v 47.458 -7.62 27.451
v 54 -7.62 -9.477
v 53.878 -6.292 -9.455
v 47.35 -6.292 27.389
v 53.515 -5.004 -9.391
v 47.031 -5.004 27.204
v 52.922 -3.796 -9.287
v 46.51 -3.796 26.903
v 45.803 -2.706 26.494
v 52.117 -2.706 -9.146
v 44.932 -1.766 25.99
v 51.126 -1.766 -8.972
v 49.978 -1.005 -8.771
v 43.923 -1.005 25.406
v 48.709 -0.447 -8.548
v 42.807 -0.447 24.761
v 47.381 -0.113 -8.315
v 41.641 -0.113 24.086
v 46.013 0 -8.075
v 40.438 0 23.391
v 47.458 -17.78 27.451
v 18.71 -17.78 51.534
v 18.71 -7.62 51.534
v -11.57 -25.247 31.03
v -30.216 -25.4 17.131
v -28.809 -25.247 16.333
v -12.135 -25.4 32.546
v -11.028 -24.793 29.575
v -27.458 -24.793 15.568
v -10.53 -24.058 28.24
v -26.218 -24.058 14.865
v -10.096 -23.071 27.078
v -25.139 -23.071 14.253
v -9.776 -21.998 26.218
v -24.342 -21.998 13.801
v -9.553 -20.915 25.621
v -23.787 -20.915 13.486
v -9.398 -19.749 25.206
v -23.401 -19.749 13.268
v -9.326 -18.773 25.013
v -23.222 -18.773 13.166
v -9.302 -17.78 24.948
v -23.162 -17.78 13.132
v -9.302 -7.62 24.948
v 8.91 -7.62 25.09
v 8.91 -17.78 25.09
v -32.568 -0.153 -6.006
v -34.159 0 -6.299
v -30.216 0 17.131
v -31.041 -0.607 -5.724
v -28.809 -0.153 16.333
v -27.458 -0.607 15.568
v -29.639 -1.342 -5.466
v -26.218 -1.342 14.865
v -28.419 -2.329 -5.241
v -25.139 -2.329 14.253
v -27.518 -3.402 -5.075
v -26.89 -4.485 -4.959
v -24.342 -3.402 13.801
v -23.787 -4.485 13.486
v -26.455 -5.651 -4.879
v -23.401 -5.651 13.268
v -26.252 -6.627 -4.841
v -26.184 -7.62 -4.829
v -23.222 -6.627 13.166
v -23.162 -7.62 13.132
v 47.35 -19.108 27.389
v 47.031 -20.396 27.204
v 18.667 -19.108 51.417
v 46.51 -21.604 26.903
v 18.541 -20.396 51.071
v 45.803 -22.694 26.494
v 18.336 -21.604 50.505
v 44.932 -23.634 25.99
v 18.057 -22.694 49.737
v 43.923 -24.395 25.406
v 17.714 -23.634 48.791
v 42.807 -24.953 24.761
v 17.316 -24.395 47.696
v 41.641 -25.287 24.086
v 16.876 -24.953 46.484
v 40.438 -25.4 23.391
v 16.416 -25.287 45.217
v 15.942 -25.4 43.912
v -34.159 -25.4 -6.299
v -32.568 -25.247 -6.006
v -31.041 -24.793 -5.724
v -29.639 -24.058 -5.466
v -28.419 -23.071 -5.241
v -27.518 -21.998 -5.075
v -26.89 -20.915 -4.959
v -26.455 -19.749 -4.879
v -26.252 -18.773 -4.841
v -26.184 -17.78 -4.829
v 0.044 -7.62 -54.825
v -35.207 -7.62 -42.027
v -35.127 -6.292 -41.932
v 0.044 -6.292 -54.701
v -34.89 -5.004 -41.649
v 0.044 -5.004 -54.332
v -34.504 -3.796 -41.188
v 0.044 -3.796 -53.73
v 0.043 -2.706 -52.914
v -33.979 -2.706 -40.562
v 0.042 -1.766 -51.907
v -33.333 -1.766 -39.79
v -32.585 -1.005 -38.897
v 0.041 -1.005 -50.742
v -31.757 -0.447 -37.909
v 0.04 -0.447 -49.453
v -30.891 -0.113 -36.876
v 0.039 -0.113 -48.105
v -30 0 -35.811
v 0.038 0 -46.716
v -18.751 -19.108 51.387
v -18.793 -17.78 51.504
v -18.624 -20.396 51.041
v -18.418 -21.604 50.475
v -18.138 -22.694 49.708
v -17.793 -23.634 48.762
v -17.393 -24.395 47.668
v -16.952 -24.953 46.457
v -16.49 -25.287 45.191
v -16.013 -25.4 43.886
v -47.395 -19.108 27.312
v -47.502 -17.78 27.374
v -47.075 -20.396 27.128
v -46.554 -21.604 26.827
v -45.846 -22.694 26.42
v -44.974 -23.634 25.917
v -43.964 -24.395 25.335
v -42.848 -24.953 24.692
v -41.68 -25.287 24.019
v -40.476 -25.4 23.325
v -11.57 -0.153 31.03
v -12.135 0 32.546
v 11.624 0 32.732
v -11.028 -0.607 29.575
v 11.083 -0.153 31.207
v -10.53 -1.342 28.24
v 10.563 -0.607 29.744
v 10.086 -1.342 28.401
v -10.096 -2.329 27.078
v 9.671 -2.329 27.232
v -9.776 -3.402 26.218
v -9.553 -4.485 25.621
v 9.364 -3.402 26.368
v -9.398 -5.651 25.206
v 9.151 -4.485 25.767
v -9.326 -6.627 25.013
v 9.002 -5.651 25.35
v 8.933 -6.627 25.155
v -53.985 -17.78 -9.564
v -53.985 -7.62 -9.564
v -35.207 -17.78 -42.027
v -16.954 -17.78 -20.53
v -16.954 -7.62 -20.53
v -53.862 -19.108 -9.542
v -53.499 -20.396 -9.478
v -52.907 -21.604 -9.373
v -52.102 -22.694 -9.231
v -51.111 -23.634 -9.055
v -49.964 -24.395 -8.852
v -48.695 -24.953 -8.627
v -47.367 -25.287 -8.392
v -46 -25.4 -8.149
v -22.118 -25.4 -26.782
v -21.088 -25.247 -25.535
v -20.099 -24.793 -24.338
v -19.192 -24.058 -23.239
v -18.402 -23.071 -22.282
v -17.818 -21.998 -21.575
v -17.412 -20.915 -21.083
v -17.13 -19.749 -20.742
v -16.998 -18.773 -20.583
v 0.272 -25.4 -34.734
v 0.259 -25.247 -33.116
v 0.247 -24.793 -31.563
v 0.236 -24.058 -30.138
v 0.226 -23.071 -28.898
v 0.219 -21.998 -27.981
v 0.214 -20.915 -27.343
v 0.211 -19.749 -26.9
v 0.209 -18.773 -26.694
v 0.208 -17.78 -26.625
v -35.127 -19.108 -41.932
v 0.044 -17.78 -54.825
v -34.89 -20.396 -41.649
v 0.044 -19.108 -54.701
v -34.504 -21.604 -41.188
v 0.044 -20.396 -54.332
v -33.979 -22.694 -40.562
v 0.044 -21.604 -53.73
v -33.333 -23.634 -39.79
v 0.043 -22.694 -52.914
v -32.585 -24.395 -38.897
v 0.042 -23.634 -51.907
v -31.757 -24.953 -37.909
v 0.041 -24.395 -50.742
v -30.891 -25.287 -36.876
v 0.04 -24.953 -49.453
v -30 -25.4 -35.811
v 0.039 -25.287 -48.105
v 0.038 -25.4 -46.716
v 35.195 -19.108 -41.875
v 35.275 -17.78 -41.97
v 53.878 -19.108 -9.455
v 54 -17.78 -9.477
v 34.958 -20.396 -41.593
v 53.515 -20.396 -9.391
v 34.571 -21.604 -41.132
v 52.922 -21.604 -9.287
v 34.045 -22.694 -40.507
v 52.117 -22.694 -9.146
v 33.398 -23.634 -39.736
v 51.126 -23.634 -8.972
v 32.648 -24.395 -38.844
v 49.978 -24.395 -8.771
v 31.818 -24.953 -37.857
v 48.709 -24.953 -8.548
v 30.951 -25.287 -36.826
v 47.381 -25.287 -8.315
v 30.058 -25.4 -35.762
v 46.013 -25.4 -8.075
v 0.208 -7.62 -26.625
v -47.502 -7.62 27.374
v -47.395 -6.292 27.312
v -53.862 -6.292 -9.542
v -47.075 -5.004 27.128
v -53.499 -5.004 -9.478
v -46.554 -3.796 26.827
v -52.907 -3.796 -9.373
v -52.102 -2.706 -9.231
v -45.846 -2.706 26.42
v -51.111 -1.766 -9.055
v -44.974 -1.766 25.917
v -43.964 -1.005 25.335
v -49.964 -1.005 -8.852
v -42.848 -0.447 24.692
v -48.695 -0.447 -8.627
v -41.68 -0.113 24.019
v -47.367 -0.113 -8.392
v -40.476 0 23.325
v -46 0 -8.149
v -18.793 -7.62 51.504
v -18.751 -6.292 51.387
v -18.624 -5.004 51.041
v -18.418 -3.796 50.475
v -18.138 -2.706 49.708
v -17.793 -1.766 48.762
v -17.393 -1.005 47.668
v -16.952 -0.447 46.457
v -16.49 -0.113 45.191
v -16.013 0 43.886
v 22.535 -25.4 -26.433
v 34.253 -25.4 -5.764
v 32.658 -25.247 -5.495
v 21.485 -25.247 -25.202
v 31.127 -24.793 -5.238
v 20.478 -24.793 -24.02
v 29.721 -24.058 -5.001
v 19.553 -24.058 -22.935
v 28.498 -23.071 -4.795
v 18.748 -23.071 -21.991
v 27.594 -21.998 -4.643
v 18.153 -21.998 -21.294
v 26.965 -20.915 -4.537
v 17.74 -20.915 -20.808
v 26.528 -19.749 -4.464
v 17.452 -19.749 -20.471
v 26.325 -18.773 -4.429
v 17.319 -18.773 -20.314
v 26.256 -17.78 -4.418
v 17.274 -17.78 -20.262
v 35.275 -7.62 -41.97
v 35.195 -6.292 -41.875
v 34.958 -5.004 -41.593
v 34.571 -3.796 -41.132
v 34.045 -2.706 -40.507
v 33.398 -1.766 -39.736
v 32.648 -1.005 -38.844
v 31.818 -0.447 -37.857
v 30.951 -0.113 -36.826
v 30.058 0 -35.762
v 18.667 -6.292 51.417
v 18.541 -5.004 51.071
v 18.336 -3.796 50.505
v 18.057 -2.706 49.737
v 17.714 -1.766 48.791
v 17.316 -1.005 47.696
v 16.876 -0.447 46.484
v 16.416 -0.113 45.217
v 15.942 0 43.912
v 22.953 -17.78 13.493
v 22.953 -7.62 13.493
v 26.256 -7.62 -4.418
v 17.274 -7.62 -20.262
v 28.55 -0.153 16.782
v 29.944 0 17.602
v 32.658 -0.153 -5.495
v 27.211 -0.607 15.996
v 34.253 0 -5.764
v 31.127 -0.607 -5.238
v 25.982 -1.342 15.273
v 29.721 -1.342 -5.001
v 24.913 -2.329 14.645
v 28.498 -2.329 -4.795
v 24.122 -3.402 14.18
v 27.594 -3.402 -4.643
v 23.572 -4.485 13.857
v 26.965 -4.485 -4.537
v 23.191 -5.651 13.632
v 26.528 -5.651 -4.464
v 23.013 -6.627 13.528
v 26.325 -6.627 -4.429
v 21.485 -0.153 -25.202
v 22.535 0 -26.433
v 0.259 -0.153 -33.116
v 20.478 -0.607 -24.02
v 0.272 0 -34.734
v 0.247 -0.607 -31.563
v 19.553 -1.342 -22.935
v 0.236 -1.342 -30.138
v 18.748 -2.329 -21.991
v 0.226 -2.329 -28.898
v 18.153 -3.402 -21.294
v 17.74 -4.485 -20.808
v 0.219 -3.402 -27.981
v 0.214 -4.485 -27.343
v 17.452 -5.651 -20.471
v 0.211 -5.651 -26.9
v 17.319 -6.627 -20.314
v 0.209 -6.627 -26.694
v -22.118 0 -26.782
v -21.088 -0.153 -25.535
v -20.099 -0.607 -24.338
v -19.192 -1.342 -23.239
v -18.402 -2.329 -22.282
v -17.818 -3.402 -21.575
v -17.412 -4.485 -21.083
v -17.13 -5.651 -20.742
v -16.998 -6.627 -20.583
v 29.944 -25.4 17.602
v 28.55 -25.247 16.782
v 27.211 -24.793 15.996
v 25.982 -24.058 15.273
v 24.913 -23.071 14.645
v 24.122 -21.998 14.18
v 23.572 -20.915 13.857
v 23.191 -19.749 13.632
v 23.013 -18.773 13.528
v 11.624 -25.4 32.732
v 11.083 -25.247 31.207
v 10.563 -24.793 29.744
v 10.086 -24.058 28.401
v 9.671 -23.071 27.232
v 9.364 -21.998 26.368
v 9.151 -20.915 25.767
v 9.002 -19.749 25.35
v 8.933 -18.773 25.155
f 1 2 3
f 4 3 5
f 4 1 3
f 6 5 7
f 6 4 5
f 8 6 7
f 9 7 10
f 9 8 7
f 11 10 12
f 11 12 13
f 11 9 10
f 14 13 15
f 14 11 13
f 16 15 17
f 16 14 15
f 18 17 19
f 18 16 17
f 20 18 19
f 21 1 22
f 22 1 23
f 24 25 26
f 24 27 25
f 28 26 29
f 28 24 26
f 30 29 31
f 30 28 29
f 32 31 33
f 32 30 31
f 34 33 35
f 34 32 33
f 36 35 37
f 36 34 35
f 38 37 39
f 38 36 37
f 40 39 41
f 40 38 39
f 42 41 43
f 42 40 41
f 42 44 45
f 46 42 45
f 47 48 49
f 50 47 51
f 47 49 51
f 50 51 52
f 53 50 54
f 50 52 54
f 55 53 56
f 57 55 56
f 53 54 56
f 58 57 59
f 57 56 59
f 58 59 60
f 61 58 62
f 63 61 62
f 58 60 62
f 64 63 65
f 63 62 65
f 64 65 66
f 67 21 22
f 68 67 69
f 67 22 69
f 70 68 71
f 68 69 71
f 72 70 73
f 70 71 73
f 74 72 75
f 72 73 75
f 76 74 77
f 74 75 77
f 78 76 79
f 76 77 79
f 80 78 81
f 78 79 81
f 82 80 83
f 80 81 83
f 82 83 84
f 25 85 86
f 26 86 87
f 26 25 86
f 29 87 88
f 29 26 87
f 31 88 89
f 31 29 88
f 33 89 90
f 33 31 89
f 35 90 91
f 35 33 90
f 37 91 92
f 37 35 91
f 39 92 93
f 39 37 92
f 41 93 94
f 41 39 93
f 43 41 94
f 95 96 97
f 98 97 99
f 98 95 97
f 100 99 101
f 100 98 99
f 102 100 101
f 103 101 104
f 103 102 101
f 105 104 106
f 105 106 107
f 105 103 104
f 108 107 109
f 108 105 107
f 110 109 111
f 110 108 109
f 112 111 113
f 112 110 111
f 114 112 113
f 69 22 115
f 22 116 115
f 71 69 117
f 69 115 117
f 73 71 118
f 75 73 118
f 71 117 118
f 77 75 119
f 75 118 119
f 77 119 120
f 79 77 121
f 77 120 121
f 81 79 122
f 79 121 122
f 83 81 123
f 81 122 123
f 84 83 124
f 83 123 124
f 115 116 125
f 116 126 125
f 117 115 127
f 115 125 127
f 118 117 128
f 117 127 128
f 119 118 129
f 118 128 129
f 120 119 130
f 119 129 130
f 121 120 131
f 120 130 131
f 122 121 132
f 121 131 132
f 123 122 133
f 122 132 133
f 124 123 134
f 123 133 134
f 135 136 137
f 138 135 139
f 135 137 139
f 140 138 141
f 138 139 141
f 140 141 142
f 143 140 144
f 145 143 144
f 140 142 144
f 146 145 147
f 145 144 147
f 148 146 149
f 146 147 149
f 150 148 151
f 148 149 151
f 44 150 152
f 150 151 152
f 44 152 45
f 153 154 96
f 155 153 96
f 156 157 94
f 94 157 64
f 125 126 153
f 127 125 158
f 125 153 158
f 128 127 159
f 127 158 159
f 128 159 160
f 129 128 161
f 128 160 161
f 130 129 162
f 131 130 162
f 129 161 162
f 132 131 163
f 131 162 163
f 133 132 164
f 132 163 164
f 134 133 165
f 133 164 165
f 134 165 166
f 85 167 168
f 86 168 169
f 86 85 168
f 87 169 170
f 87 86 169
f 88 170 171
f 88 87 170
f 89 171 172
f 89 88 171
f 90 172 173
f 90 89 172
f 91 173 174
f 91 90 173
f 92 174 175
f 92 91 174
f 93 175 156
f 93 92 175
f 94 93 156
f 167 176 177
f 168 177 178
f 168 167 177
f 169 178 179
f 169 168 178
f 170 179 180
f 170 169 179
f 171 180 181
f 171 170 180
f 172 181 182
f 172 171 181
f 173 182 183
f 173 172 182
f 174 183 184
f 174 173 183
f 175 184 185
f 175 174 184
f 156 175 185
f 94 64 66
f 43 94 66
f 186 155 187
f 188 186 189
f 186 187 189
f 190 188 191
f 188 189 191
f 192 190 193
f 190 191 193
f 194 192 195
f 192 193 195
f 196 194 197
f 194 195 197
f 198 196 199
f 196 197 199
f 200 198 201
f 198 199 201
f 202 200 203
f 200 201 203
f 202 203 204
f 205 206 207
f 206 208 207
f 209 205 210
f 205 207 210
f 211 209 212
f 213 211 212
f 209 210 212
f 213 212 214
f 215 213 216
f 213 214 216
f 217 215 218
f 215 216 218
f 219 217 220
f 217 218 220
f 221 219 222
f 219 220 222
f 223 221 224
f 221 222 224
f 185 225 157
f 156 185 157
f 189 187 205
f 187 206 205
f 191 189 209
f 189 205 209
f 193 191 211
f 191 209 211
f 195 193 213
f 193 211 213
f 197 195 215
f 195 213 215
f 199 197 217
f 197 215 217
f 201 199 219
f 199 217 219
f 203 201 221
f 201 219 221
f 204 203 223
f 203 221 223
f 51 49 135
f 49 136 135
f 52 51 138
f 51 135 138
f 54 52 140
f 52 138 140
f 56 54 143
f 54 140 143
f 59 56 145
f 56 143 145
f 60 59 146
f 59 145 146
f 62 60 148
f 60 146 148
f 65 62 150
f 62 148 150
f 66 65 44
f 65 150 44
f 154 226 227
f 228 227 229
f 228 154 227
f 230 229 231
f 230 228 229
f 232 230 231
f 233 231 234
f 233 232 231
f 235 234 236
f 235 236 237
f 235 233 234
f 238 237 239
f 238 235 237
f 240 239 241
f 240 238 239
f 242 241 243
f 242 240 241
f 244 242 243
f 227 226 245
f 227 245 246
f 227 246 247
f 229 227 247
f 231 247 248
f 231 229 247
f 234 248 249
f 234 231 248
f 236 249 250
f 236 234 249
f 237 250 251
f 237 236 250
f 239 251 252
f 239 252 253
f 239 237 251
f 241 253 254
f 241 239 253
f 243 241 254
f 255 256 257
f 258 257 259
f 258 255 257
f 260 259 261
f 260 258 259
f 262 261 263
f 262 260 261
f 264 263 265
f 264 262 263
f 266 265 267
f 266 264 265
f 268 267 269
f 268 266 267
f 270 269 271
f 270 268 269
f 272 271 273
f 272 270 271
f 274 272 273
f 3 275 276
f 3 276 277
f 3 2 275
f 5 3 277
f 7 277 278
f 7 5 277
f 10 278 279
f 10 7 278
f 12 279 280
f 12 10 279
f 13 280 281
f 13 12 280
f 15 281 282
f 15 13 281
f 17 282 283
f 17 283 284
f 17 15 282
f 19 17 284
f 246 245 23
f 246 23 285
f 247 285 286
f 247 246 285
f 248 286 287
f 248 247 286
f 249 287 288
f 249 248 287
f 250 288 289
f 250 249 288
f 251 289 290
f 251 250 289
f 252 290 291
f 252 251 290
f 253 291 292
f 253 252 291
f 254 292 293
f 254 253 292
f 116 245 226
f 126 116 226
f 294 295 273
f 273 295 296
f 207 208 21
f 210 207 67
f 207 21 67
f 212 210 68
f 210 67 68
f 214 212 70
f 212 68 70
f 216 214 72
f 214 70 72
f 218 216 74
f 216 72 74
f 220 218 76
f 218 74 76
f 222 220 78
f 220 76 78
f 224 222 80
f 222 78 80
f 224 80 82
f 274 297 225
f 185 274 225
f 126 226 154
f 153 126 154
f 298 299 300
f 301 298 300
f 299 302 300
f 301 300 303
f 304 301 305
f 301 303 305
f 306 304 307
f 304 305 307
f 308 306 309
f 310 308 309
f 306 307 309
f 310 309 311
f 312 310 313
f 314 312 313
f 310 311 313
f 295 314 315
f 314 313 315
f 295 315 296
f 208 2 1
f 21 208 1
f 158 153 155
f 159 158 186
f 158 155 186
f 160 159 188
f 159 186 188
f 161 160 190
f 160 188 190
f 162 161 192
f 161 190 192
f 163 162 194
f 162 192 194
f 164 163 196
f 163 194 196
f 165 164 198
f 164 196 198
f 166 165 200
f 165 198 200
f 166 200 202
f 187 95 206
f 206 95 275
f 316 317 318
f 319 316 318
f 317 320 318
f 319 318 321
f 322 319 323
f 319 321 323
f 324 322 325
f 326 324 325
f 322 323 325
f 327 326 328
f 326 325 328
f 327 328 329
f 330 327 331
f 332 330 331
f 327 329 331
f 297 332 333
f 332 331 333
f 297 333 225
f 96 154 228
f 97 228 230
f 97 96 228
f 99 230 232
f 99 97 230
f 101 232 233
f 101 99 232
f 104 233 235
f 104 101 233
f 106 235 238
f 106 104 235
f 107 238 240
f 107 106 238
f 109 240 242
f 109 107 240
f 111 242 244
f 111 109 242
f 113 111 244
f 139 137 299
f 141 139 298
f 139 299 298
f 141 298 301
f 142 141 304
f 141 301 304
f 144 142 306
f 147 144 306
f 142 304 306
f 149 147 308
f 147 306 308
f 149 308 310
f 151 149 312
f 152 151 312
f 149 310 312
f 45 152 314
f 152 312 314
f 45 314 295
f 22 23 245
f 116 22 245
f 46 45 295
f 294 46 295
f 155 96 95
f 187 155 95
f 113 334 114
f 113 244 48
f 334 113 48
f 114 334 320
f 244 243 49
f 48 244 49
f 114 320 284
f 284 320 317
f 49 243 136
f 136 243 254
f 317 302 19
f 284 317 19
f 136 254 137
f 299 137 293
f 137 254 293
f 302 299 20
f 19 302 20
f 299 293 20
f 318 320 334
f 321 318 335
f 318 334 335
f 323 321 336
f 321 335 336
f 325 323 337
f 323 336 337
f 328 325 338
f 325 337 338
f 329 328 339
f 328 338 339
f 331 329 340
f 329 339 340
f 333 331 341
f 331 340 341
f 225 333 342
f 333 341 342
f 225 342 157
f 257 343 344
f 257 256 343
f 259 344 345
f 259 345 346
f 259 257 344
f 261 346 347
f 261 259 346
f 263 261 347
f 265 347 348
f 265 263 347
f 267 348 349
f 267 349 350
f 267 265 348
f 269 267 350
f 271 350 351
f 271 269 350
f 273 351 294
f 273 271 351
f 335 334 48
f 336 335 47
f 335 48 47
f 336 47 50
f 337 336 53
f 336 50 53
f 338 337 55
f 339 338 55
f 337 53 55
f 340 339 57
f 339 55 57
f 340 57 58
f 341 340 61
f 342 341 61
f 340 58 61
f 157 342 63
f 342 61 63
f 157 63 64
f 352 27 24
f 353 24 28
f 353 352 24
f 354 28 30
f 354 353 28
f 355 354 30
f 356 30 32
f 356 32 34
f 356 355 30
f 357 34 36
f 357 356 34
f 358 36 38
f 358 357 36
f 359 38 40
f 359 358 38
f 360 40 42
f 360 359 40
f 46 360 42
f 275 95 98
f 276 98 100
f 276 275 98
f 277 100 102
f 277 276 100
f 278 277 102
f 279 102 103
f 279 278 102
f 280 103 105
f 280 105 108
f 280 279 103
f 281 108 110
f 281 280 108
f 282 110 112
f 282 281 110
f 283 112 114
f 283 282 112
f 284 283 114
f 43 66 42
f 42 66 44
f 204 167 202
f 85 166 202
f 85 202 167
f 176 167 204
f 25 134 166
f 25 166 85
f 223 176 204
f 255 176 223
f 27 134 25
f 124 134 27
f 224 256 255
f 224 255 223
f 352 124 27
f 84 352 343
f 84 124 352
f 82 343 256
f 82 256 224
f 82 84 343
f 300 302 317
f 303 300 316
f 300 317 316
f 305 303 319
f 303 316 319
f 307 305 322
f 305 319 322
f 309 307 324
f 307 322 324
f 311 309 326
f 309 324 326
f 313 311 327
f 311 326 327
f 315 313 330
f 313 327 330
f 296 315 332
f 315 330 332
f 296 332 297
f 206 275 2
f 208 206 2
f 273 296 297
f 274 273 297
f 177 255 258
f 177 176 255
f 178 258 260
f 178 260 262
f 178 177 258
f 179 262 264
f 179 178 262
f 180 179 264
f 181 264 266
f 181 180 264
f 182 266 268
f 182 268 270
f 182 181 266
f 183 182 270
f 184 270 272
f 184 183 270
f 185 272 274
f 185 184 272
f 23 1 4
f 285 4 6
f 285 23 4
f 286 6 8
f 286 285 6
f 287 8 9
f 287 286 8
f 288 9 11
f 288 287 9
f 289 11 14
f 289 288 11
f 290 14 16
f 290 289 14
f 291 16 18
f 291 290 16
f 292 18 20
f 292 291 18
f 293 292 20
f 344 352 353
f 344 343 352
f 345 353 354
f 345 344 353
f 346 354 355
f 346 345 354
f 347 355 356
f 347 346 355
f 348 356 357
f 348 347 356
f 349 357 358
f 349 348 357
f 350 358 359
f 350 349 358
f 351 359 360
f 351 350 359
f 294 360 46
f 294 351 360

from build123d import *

# Parameters (mm, degrees)
F1_DEPTH = 25.4
F2_R     = 7.62
F3_R     = 7.62


with BuildPart() as f1:
    # F0 (on Front) → F1 (new body)
    with BuildSketch(Plane.XZ):
        Polygon((-53.984559, -9.564054), (-35.206915, -42.027096), (0.044435, -54.825192), (35.274993, -41.969972), (53.999991, -9.476535), (47.457792, 27.451078), (18.709565, 51.534026), (-18.793075, 51.503631), (-47.502227, 27.374115), align=None)
        Polygon((0.208474, -26.624716), (-16.954337, -20.52972), (-26.184025, -4.82864), (-23.161917, 13.131814), (-9.302091, 24.947747), (8.910288, 25.090351), (22.953443, 13.492902), (26.256428, -4.418027), (17.273738, -20.261711), align=None, mode=Mode.SUBTRACT)
    extrude(amount=F1_DEPTH)

    # F2
    f2_edges = [f1.edges().sort_by_distance(p)[0] for p in [
        (-0.041755, 0, 51.518829),
        (-33.147651, 0, 39.438873),
        (-50.743393, 0, 8.90503),
        (-44.595737, 0, -25.795575),
        (-17.58124, 0, -48.426144),
        (17.659714, 0, -48.397582),
        (44.637492, 0, -25.723254),
        (50.728891, 0, 8.987271),
        (33.083679, 0, 39.492552),
        (-33.147651, -25.4, 39.438873),
        (-0.041755, -25.4, 51.518829),
        (33.083679, -25.4, 39.492552),
        (50.728891, -25.4, 8.987271),
        (44.637492, -25.4, -25.723254),
        (17.659714, -25.4, -48.397582),
        (-17.58124, -25.4, -48.426144),
        (-44.595737, -25.4, -25.795575),
        (-50.743393, -25.4, 8.90503),
    ]]
    fillet(f2_edges, radius=F2_R)

    # F3
    f3_edges = [f1.edges().sort_by_distance(p)[0] for p in [
        (15.931865, -25.4, 19.291626),
        (24.604935, -25.4, 4.537438),
        (21.765083, -25.4, -12.339869),
        (8.741106, -25.4, -23.443213),
        (-8.372932, -25.4, -23.577218),
        (-21.569181, -25.4, -12.67918),
        (-24.672971, -25.4, 4.151587),
        (-16.232004, -25.4, 19.03978),
        (-0.195901, -25.4, 25.019049),
        (-8.372932, 0, -23.577218),
        (8.741106, 0, -23.443213),
        (21.765083, 0, -12.339869),
        (24.604935, 0, 4.537438),
        (15.931865, 0, 19.291626),
        (-0.195901, 0, 25.019049),
        (-16.232004, 0, 19.03978),
        (-24.672971, 0, 4.151587),
        (-21.569181, 0, -12.67918),
    ]]
    fillet(f3_edges, radius=F3_R)


solid = f1.part
